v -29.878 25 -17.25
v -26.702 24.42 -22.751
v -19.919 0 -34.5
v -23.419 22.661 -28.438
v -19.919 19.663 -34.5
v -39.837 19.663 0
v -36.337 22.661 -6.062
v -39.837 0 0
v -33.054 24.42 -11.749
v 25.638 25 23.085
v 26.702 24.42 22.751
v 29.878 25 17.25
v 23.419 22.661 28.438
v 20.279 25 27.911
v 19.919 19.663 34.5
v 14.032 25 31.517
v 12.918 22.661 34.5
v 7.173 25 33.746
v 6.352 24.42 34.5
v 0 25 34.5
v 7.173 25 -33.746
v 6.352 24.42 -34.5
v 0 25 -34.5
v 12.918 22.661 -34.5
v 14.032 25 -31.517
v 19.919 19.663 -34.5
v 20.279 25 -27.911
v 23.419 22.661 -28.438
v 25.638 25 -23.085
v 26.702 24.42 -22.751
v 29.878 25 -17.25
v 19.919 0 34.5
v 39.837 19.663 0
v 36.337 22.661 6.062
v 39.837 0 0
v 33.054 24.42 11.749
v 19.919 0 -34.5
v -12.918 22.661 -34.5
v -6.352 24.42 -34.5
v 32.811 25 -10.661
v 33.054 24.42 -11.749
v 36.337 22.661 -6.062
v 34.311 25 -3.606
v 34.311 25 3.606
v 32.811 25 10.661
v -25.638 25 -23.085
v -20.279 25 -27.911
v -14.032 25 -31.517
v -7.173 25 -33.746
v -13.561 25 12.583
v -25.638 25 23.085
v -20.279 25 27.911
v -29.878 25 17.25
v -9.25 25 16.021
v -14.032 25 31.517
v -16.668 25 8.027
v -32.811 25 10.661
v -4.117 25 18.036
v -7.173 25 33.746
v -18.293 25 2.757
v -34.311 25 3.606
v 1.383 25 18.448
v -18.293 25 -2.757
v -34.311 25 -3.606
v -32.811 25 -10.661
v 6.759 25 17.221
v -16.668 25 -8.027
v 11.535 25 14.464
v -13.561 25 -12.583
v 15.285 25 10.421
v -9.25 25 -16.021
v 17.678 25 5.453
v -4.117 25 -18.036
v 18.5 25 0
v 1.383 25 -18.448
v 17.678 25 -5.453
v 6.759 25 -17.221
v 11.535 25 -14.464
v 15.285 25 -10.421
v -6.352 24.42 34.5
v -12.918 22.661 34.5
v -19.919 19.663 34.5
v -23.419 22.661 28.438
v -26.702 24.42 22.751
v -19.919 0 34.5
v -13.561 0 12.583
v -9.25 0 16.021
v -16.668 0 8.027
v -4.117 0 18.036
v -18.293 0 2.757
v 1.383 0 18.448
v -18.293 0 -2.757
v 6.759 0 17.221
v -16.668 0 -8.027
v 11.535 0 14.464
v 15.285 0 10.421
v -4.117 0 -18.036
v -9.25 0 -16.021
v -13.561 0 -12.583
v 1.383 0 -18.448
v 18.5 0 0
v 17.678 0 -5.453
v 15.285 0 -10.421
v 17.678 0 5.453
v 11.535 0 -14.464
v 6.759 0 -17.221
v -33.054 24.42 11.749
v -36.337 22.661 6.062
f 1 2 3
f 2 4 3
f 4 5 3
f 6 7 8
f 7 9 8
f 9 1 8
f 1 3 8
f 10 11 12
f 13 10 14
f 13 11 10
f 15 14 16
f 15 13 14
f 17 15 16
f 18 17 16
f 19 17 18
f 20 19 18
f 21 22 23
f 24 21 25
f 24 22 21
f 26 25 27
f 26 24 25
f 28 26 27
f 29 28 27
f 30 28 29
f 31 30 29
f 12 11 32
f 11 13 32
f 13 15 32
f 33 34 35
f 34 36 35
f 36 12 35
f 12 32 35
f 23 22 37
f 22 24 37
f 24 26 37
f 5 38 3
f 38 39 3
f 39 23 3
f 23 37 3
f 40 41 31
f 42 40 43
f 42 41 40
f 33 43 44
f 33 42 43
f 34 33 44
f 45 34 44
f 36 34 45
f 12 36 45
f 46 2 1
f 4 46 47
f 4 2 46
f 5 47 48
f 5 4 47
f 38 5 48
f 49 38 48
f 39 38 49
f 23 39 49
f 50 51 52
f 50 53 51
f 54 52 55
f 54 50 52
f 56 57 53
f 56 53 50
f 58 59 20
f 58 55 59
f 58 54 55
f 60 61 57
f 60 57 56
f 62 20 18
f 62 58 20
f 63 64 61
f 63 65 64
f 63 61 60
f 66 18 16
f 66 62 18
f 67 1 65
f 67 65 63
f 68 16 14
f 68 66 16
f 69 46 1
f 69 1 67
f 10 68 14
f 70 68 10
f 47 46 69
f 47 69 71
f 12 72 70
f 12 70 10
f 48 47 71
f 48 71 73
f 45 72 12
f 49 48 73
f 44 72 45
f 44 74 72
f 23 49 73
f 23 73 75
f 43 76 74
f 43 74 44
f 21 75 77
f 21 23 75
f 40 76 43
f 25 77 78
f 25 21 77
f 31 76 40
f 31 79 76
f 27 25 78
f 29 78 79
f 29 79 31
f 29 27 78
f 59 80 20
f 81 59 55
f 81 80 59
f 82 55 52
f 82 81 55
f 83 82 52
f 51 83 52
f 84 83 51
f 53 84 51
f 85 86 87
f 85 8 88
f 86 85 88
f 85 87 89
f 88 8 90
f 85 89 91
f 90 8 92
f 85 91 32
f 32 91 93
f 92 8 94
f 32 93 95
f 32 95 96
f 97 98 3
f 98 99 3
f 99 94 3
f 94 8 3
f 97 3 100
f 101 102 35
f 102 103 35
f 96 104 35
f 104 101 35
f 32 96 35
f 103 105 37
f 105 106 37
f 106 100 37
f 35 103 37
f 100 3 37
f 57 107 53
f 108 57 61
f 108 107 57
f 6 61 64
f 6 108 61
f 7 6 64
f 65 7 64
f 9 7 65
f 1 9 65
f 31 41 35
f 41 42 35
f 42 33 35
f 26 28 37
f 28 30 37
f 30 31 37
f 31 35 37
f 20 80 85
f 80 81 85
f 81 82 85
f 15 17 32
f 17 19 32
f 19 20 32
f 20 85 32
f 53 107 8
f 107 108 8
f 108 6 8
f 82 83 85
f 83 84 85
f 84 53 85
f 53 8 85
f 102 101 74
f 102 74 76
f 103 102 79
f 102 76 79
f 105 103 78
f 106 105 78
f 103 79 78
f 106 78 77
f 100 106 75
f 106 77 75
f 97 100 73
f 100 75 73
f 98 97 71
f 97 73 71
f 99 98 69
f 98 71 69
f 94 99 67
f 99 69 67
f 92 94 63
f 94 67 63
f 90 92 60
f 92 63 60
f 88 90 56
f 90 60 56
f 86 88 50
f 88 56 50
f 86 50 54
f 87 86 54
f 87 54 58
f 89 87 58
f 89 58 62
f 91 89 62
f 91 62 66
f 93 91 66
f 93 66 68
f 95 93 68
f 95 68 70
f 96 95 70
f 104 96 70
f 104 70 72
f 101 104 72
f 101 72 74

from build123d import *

# Parameters (mm, degrees)
BOSS_EXTRUDE1_DEPTH = 25
SKETCH2_OUTSIDE_W   = 153.338
SKETCH2_OUTSIDE_H   = 142.664
SKETCH2_OUTSIDE_R   = 34.5
CUT_EXTRUDE1_DEPTH  = 25
CUT_EXTRUDE1_TAPER  = 45
SKETCH3_R           = 18.5
CUT_EXTRUDE2_DEPTH  = 26


with BuildPart() as part:
    # Sketch1 → Boss-Extrude1 (new body)
    with BuildSketch(Plane(origin=(0, 0, 0), x_dir=(1, 0, 0), z_dir=(0, 1, 0))):
        Polygon((19.918584287, 34.5), (-19.918584287, 34.5), (-39.837168574, 0), (-19.918584287, -34.5), (19.918584287, -34.5), (39.837168574, 0), align=None)
    extrude(amount=BOSS_EXTRUDE1_DEPTH)

    # Sketch2 outside → Cut-Extrude1 (cut)
    with BuildSketch(Plane(origin=(0, 25, 0), x_dir=(1, 0, 0), z_dir=(0, 1, 0))):
        Rectangle(SKETCH2_OUTSIDE_W, SKETCH2_OUTSIDE_H)
        Circle(SKETCH2_OUTSIDE_R, mode=Mode.SUBTRACT)
    extrude(amount=-CUT_EXTRUDE1_DEPTH, taper=CUT_EXTRUDE1_TAPER, mode=Mode.SUBTRACT)

    # Sketch3 → Cut-Extrude2 (cut, through all)
    with BuildSketch(Plane(origin=(0, 25, 0), x_dir=(1, 0, 0), z_dir=(0, 1, 0))):
        Circle(SKETCH3_R)
    extrude(amount=-CUT_EXTRUDE2_DEPTH, mode=Mode.SUBTRACT)


solid = part.part
